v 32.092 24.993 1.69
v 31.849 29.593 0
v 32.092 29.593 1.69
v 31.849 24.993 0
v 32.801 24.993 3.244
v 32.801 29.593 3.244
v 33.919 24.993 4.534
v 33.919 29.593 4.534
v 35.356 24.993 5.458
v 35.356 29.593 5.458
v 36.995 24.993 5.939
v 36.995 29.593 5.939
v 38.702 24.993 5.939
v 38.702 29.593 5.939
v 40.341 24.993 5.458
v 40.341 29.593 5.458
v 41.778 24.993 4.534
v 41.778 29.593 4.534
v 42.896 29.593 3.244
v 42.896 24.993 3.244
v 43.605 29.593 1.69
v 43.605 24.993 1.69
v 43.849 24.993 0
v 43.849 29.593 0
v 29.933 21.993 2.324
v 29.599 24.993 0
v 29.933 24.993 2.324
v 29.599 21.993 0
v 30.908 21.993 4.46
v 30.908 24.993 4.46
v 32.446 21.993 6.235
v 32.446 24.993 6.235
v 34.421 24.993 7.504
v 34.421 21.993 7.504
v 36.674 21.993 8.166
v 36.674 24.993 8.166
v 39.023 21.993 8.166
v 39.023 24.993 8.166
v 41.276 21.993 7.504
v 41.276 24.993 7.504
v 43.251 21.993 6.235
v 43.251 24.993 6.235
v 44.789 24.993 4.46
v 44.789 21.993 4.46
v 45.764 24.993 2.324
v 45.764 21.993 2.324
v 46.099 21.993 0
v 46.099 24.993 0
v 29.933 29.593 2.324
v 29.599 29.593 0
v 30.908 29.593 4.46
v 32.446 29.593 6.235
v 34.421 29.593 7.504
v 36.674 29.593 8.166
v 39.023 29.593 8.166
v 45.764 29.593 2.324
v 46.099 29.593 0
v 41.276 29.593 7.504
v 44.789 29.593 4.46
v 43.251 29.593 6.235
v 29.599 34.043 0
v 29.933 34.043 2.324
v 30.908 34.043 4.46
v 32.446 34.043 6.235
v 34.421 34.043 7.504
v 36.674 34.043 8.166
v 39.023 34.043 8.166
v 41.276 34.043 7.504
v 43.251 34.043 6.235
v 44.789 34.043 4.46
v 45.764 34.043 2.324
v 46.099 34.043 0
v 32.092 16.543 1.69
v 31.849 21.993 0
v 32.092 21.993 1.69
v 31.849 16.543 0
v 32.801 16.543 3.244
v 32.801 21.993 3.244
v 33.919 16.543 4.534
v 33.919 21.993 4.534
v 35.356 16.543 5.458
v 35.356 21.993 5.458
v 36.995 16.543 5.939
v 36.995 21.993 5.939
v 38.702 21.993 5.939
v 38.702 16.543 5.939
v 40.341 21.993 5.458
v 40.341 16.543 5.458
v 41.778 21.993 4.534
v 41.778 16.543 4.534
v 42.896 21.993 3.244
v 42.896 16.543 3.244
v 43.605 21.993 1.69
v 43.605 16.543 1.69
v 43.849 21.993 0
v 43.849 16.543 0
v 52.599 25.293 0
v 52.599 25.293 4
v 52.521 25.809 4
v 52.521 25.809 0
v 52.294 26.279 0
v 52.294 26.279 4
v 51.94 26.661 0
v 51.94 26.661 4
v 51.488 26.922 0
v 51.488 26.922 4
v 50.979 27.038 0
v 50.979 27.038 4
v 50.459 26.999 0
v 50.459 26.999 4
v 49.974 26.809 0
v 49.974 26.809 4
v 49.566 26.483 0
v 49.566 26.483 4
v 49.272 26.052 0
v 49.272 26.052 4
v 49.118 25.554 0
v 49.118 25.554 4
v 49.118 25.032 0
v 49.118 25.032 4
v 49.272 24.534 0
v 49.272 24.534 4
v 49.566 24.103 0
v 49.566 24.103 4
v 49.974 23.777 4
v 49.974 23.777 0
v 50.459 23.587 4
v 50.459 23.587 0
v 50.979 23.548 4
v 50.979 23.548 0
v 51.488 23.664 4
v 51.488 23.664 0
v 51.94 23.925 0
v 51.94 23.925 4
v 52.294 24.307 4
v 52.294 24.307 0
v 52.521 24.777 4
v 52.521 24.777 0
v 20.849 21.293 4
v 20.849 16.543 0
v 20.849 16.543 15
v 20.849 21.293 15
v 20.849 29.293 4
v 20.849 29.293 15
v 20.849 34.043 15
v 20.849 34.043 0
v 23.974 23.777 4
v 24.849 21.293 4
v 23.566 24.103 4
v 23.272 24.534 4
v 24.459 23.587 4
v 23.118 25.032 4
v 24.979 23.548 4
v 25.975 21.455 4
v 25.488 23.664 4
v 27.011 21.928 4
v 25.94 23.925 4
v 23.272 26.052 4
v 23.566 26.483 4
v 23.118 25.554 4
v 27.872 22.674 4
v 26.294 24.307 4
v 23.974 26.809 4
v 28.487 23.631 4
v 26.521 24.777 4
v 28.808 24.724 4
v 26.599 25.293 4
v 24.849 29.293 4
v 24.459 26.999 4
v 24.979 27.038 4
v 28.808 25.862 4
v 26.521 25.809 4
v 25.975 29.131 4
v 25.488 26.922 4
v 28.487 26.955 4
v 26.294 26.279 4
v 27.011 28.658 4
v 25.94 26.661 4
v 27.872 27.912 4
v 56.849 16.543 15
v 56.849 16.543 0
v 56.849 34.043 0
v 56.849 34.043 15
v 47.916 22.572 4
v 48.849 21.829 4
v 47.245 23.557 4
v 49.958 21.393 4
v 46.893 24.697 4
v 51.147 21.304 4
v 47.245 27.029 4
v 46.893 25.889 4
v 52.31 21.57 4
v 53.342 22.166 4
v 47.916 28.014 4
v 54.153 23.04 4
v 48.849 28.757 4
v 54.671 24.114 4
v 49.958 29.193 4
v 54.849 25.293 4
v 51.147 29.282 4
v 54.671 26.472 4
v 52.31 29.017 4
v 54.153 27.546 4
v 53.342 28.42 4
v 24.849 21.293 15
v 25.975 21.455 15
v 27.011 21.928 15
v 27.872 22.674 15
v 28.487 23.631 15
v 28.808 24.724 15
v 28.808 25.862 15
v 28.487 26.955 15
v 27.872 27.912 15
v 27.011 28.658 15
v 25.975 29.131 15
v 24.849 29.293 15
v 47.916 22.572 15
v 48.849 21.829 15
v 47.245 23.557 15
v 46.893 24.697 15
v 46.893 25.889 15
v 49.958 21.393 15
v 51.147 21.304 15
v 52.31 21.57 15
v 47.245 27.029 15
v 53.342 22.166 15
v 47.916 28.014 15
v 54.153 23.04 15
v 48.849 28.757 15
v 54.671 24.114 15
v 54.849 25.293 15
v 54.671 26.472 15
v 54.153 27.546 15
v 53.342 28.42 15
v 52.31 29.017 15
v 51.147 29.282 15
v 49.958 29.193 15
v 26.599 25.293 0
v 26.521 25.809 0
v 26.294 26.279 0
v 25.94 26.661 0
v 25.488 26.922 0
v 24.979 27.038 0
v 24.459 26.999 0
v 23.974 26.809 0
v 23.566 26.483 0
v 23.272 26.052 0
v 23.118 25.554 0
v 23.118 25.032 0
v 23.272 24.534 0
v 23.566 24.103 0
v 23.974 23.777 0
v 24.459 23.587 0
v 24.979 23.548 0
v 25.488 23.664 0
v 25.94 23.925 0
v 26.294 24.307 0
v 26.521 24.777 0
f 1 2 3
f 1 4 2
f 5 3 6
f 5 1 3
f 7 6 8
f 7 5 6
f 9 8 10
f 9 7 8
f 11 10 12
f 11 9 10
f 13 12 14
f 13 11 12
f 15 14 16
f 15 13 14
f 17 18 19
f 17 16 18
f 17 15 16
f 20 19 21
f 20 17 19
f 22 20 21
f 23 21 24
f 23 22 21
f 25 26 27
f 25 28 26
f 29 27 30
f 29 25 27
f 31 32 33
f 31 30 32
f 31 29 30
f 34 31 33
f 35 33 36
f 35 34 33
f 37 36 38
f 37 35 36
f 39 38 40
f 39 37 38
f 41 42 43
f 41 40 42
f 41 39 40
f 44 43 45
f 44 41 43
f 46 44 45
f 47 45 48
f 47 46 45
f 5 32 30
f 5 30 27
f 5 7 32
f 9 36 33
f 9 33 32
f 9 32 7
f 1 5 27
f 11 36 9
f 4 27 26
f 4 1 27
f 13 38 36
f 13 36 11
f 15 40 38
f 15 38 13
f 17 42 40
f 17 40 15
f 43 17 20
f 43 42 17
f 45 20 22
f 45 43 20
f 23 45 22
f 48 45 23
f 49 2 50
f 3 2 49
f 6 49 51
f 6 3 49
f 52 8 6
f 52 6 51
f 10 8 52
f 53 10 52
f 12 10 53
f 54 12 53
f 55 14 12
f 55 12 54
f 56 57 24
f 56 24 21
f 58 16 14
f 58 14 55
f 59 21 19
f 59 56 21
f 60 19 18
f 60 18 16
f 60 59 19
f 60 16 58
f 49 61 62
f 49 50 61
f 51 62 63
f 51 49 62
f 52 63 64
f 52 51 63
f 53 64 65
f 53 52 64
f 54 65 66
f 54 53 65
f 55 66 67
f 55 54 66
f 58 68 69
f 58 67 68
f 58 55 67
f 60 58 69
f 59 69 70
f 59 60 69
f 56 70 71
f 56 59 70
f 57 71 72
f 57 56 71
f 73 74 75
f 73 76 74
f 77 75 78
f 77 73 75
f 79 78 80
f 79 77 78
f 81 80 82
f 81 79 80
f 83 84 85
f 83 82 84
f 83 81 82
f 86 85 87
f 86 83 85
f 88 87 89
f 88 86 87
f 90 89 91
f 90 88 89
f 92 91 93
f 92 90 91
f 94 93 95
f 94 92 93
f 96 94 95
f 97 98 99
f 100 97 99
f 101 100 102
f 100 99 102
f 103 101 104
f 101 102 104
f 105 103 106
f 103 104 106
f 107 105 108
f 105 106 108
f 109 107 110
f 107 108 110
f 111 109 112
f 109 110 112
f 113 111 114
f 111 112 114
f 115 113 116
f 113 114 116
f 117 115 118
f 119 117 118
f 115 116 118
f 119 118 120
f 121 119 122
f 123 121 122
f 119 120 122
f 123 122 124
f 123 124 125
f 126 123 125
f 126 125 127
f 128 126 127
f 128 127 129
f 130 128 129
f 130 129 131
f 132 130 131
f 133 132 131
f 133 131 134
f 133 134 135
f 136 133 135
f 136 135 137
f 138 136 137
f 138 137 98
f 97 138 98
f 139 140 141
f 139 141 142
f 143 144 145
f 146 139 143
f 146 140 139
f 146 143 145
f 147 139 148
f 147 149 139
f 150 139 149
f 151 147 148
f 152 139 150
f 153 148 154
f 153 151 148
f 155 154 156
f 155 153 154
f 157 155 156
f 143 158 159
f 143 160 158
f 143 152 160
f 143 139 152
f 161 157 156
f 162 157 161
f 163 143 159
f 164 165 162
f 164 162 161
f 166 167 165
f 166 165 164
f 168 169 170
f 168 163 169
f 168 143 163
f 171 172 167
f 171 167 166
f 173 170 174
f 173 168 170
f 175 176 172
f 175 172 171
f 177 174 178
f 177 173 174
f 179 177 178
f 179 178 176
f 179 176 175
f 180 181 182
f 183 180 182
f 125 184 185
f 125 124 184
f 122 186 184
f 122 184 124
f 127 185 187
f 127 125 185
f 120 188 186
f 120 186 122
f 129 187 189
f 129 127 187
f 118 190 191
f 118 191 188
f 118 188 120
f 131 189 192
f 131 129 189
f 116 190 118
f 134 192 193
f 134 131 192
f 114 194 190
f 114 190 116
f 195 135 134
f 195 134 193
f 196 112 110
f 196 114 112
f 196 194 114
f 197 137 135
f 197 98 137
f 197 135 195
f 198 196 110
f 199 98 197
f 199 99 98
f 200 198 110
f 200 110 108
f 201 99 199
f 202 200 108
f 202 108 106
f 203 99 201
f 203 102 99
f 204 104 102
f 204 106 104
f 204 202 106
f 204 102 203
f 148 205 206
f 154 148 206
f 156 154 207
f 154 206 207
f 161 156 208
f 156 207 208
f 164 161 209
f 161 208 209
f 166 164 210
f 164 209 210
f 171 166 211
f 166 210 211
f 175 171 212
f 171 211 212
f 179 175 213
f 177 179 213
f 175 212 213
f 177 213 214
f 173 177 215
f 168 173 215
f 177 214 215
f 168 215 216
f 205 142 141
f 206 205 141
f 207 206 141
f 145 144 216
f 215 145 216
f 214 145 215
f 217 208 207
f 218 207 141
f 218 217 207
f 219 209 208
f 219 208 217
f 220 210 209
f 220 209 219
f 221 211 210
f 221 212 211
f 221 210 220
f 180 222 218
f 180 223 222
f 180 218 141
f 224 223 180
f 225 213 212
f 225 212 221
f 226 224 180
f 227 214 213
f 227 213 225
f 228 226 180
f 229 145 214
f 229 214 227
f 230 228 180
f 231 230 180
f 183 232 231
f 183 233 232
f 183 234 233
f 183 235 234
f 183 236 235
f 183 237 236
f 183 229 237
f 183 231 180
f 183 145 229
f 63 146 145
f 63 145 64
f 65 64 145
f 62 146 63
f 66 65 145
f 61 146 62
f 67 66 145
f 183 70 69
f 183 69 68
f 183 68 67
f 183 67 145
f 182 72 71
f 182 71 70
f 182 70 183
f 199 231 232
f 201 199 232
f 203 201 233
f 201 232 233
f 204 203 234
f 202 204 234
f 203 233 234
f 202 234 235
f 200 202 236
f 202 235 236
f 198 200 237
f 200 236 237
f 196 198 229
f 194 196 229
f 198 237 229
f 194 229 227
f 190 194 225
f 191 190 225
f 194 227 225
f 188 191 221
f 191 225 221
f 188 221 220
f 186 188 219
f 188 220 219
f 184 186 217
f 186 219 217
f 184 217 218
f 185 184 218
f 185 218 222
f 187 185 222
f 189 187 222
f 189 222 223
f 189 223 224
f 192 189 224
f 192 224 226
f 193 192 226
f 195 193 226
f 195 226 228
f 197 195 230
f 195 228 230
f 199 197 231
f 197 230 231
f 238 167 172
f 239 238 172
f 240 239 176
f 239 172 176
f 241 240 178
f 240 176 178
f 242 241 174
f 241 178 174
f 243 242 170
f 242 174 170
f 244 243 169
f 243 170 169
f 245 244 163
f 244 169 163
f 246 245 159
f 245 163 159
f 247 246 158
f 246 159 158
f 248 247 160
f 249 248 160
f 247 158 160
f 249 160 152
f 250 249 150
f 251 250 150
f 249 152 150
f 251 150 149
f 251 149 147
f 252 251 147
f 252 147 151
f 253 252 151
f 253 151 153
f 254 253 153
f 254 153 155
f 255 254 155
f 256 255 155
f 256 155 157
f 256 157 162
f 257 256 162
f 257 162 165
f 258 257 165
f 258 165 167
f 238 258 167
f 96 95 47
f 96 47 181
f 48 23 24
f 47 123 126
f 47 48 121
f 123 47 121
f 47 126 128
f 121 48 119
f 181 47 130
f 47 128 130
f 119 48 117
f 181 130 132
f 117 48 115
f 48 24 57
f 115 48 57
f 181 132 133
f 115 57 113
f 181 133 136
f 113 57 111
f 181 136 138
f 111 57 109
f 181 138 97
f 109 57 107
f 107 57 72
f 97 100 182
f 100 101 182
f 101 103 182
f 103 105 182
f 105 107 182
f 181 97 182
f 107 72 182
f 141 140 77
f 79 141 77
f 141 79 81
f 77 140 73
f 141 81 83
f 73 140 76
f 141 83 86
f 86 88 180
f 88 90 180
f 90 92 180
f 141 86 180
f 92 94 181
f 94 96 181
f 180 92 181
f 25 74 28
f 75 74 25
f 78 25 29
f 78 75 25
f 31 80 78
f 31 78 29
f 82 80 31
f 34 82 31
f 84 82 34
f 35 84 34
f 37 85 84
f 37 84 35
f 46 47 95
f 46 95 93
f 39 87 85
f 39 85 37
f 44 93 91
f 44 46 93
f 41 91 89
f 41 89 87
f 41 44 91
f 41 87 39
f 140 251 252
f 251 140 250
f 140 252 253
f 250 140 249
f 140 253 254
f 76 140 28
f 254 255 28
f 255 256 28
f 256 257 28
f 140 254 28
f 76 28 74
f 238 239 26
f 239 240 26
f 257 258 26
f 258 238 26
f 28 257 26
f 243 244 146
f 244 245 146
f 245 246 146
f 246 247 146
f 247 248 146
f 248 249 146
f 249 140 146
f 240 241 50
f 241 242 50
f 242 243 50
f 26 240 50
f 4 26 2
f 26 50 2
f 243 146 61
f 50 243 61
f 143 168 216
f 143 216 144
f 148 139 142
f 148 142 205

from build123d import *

# Parameters (mm, degrees)
SKETCH1_W           = 36
SKETCH1_H           = 17.5
BOSS_EXTRUDE1_DEPTH = 15
SKETCH2_R           = 1.75
CUT_EXTRUDE1_DEPTH  = 15
SKETCH3_R           = 4
CUT_EXTRUDE2_DEPTH  = 11


with BuildPart() as part:
    # Sketch1 → Boss-Extrude1 (new body)
    with BuildSketch(Plane.XY):
        with Locations((38.848522366, 25.293010486)):
            Rectangle(SKETCH1_W, SKETCH1_H)
    extrude(amount=BOSS_EXTRUDE1_DEPTH)

    # Sketch2 → Cut-Extrude1 (cut)
    with BuildSketch(Plane.XY.offset(15)):
        with Locations((50.848522366, 25.293010486)):
            Circle(SKETCH2_R)
        with Locations((24.848522366, 25.293010486)):
            Circle(SKETCH2_R)
    extrude(amount=-CUT_EXTRUDE1_DEPTH, mode=Mode.SUBTRACT)

    # Sketch3 → Cut-Extrude2 (cut)
    with BuildSketch(Plane.XY.offset(15)):
        with Locations((50.848522366, 25.293010486)):
            Circle(SKETCH3_R)
        with BuildLine():
            Line((24.848522366, 29.293010486), (20.848522366, 29.293010486))
            Line((20.848522366, 29.293010486), (20.848522366, 21.293010486))
            Line((20.848522366, 21.293010486), (24.848522366, 21.293010486))
            ThreePointArc((24.848522366, 21.293010486), (28.848522366, 25.293010486), (24.848522366, 29.293010486))
        make_face()
    extrude(amount=-CUT_EXTRUDE2_DEPTH, mode=Mode.SUBTRACT)

    # Sketch4 → Cut-Revolve1 (revolve, cut)
    with BuildSketch(Plane.ZY.offset(-37.848522366)):
        Polygon((0, 16.543010486), (0, 34.293010486), (8.25, 34.293010486), (8.25, 29.593010486), (6, 29.593010486), (6, 24.993010486), (8.25, 24.993010486), (8.25, 21.993010486), (6, 21.993010486), (6, 16.543010486), align=None)
    revolve(axis=Axis((37.848522366, 16.543010486, 0), (0, 1, 0)), mode=Mode.SUBTRACT)


solid = part.part
